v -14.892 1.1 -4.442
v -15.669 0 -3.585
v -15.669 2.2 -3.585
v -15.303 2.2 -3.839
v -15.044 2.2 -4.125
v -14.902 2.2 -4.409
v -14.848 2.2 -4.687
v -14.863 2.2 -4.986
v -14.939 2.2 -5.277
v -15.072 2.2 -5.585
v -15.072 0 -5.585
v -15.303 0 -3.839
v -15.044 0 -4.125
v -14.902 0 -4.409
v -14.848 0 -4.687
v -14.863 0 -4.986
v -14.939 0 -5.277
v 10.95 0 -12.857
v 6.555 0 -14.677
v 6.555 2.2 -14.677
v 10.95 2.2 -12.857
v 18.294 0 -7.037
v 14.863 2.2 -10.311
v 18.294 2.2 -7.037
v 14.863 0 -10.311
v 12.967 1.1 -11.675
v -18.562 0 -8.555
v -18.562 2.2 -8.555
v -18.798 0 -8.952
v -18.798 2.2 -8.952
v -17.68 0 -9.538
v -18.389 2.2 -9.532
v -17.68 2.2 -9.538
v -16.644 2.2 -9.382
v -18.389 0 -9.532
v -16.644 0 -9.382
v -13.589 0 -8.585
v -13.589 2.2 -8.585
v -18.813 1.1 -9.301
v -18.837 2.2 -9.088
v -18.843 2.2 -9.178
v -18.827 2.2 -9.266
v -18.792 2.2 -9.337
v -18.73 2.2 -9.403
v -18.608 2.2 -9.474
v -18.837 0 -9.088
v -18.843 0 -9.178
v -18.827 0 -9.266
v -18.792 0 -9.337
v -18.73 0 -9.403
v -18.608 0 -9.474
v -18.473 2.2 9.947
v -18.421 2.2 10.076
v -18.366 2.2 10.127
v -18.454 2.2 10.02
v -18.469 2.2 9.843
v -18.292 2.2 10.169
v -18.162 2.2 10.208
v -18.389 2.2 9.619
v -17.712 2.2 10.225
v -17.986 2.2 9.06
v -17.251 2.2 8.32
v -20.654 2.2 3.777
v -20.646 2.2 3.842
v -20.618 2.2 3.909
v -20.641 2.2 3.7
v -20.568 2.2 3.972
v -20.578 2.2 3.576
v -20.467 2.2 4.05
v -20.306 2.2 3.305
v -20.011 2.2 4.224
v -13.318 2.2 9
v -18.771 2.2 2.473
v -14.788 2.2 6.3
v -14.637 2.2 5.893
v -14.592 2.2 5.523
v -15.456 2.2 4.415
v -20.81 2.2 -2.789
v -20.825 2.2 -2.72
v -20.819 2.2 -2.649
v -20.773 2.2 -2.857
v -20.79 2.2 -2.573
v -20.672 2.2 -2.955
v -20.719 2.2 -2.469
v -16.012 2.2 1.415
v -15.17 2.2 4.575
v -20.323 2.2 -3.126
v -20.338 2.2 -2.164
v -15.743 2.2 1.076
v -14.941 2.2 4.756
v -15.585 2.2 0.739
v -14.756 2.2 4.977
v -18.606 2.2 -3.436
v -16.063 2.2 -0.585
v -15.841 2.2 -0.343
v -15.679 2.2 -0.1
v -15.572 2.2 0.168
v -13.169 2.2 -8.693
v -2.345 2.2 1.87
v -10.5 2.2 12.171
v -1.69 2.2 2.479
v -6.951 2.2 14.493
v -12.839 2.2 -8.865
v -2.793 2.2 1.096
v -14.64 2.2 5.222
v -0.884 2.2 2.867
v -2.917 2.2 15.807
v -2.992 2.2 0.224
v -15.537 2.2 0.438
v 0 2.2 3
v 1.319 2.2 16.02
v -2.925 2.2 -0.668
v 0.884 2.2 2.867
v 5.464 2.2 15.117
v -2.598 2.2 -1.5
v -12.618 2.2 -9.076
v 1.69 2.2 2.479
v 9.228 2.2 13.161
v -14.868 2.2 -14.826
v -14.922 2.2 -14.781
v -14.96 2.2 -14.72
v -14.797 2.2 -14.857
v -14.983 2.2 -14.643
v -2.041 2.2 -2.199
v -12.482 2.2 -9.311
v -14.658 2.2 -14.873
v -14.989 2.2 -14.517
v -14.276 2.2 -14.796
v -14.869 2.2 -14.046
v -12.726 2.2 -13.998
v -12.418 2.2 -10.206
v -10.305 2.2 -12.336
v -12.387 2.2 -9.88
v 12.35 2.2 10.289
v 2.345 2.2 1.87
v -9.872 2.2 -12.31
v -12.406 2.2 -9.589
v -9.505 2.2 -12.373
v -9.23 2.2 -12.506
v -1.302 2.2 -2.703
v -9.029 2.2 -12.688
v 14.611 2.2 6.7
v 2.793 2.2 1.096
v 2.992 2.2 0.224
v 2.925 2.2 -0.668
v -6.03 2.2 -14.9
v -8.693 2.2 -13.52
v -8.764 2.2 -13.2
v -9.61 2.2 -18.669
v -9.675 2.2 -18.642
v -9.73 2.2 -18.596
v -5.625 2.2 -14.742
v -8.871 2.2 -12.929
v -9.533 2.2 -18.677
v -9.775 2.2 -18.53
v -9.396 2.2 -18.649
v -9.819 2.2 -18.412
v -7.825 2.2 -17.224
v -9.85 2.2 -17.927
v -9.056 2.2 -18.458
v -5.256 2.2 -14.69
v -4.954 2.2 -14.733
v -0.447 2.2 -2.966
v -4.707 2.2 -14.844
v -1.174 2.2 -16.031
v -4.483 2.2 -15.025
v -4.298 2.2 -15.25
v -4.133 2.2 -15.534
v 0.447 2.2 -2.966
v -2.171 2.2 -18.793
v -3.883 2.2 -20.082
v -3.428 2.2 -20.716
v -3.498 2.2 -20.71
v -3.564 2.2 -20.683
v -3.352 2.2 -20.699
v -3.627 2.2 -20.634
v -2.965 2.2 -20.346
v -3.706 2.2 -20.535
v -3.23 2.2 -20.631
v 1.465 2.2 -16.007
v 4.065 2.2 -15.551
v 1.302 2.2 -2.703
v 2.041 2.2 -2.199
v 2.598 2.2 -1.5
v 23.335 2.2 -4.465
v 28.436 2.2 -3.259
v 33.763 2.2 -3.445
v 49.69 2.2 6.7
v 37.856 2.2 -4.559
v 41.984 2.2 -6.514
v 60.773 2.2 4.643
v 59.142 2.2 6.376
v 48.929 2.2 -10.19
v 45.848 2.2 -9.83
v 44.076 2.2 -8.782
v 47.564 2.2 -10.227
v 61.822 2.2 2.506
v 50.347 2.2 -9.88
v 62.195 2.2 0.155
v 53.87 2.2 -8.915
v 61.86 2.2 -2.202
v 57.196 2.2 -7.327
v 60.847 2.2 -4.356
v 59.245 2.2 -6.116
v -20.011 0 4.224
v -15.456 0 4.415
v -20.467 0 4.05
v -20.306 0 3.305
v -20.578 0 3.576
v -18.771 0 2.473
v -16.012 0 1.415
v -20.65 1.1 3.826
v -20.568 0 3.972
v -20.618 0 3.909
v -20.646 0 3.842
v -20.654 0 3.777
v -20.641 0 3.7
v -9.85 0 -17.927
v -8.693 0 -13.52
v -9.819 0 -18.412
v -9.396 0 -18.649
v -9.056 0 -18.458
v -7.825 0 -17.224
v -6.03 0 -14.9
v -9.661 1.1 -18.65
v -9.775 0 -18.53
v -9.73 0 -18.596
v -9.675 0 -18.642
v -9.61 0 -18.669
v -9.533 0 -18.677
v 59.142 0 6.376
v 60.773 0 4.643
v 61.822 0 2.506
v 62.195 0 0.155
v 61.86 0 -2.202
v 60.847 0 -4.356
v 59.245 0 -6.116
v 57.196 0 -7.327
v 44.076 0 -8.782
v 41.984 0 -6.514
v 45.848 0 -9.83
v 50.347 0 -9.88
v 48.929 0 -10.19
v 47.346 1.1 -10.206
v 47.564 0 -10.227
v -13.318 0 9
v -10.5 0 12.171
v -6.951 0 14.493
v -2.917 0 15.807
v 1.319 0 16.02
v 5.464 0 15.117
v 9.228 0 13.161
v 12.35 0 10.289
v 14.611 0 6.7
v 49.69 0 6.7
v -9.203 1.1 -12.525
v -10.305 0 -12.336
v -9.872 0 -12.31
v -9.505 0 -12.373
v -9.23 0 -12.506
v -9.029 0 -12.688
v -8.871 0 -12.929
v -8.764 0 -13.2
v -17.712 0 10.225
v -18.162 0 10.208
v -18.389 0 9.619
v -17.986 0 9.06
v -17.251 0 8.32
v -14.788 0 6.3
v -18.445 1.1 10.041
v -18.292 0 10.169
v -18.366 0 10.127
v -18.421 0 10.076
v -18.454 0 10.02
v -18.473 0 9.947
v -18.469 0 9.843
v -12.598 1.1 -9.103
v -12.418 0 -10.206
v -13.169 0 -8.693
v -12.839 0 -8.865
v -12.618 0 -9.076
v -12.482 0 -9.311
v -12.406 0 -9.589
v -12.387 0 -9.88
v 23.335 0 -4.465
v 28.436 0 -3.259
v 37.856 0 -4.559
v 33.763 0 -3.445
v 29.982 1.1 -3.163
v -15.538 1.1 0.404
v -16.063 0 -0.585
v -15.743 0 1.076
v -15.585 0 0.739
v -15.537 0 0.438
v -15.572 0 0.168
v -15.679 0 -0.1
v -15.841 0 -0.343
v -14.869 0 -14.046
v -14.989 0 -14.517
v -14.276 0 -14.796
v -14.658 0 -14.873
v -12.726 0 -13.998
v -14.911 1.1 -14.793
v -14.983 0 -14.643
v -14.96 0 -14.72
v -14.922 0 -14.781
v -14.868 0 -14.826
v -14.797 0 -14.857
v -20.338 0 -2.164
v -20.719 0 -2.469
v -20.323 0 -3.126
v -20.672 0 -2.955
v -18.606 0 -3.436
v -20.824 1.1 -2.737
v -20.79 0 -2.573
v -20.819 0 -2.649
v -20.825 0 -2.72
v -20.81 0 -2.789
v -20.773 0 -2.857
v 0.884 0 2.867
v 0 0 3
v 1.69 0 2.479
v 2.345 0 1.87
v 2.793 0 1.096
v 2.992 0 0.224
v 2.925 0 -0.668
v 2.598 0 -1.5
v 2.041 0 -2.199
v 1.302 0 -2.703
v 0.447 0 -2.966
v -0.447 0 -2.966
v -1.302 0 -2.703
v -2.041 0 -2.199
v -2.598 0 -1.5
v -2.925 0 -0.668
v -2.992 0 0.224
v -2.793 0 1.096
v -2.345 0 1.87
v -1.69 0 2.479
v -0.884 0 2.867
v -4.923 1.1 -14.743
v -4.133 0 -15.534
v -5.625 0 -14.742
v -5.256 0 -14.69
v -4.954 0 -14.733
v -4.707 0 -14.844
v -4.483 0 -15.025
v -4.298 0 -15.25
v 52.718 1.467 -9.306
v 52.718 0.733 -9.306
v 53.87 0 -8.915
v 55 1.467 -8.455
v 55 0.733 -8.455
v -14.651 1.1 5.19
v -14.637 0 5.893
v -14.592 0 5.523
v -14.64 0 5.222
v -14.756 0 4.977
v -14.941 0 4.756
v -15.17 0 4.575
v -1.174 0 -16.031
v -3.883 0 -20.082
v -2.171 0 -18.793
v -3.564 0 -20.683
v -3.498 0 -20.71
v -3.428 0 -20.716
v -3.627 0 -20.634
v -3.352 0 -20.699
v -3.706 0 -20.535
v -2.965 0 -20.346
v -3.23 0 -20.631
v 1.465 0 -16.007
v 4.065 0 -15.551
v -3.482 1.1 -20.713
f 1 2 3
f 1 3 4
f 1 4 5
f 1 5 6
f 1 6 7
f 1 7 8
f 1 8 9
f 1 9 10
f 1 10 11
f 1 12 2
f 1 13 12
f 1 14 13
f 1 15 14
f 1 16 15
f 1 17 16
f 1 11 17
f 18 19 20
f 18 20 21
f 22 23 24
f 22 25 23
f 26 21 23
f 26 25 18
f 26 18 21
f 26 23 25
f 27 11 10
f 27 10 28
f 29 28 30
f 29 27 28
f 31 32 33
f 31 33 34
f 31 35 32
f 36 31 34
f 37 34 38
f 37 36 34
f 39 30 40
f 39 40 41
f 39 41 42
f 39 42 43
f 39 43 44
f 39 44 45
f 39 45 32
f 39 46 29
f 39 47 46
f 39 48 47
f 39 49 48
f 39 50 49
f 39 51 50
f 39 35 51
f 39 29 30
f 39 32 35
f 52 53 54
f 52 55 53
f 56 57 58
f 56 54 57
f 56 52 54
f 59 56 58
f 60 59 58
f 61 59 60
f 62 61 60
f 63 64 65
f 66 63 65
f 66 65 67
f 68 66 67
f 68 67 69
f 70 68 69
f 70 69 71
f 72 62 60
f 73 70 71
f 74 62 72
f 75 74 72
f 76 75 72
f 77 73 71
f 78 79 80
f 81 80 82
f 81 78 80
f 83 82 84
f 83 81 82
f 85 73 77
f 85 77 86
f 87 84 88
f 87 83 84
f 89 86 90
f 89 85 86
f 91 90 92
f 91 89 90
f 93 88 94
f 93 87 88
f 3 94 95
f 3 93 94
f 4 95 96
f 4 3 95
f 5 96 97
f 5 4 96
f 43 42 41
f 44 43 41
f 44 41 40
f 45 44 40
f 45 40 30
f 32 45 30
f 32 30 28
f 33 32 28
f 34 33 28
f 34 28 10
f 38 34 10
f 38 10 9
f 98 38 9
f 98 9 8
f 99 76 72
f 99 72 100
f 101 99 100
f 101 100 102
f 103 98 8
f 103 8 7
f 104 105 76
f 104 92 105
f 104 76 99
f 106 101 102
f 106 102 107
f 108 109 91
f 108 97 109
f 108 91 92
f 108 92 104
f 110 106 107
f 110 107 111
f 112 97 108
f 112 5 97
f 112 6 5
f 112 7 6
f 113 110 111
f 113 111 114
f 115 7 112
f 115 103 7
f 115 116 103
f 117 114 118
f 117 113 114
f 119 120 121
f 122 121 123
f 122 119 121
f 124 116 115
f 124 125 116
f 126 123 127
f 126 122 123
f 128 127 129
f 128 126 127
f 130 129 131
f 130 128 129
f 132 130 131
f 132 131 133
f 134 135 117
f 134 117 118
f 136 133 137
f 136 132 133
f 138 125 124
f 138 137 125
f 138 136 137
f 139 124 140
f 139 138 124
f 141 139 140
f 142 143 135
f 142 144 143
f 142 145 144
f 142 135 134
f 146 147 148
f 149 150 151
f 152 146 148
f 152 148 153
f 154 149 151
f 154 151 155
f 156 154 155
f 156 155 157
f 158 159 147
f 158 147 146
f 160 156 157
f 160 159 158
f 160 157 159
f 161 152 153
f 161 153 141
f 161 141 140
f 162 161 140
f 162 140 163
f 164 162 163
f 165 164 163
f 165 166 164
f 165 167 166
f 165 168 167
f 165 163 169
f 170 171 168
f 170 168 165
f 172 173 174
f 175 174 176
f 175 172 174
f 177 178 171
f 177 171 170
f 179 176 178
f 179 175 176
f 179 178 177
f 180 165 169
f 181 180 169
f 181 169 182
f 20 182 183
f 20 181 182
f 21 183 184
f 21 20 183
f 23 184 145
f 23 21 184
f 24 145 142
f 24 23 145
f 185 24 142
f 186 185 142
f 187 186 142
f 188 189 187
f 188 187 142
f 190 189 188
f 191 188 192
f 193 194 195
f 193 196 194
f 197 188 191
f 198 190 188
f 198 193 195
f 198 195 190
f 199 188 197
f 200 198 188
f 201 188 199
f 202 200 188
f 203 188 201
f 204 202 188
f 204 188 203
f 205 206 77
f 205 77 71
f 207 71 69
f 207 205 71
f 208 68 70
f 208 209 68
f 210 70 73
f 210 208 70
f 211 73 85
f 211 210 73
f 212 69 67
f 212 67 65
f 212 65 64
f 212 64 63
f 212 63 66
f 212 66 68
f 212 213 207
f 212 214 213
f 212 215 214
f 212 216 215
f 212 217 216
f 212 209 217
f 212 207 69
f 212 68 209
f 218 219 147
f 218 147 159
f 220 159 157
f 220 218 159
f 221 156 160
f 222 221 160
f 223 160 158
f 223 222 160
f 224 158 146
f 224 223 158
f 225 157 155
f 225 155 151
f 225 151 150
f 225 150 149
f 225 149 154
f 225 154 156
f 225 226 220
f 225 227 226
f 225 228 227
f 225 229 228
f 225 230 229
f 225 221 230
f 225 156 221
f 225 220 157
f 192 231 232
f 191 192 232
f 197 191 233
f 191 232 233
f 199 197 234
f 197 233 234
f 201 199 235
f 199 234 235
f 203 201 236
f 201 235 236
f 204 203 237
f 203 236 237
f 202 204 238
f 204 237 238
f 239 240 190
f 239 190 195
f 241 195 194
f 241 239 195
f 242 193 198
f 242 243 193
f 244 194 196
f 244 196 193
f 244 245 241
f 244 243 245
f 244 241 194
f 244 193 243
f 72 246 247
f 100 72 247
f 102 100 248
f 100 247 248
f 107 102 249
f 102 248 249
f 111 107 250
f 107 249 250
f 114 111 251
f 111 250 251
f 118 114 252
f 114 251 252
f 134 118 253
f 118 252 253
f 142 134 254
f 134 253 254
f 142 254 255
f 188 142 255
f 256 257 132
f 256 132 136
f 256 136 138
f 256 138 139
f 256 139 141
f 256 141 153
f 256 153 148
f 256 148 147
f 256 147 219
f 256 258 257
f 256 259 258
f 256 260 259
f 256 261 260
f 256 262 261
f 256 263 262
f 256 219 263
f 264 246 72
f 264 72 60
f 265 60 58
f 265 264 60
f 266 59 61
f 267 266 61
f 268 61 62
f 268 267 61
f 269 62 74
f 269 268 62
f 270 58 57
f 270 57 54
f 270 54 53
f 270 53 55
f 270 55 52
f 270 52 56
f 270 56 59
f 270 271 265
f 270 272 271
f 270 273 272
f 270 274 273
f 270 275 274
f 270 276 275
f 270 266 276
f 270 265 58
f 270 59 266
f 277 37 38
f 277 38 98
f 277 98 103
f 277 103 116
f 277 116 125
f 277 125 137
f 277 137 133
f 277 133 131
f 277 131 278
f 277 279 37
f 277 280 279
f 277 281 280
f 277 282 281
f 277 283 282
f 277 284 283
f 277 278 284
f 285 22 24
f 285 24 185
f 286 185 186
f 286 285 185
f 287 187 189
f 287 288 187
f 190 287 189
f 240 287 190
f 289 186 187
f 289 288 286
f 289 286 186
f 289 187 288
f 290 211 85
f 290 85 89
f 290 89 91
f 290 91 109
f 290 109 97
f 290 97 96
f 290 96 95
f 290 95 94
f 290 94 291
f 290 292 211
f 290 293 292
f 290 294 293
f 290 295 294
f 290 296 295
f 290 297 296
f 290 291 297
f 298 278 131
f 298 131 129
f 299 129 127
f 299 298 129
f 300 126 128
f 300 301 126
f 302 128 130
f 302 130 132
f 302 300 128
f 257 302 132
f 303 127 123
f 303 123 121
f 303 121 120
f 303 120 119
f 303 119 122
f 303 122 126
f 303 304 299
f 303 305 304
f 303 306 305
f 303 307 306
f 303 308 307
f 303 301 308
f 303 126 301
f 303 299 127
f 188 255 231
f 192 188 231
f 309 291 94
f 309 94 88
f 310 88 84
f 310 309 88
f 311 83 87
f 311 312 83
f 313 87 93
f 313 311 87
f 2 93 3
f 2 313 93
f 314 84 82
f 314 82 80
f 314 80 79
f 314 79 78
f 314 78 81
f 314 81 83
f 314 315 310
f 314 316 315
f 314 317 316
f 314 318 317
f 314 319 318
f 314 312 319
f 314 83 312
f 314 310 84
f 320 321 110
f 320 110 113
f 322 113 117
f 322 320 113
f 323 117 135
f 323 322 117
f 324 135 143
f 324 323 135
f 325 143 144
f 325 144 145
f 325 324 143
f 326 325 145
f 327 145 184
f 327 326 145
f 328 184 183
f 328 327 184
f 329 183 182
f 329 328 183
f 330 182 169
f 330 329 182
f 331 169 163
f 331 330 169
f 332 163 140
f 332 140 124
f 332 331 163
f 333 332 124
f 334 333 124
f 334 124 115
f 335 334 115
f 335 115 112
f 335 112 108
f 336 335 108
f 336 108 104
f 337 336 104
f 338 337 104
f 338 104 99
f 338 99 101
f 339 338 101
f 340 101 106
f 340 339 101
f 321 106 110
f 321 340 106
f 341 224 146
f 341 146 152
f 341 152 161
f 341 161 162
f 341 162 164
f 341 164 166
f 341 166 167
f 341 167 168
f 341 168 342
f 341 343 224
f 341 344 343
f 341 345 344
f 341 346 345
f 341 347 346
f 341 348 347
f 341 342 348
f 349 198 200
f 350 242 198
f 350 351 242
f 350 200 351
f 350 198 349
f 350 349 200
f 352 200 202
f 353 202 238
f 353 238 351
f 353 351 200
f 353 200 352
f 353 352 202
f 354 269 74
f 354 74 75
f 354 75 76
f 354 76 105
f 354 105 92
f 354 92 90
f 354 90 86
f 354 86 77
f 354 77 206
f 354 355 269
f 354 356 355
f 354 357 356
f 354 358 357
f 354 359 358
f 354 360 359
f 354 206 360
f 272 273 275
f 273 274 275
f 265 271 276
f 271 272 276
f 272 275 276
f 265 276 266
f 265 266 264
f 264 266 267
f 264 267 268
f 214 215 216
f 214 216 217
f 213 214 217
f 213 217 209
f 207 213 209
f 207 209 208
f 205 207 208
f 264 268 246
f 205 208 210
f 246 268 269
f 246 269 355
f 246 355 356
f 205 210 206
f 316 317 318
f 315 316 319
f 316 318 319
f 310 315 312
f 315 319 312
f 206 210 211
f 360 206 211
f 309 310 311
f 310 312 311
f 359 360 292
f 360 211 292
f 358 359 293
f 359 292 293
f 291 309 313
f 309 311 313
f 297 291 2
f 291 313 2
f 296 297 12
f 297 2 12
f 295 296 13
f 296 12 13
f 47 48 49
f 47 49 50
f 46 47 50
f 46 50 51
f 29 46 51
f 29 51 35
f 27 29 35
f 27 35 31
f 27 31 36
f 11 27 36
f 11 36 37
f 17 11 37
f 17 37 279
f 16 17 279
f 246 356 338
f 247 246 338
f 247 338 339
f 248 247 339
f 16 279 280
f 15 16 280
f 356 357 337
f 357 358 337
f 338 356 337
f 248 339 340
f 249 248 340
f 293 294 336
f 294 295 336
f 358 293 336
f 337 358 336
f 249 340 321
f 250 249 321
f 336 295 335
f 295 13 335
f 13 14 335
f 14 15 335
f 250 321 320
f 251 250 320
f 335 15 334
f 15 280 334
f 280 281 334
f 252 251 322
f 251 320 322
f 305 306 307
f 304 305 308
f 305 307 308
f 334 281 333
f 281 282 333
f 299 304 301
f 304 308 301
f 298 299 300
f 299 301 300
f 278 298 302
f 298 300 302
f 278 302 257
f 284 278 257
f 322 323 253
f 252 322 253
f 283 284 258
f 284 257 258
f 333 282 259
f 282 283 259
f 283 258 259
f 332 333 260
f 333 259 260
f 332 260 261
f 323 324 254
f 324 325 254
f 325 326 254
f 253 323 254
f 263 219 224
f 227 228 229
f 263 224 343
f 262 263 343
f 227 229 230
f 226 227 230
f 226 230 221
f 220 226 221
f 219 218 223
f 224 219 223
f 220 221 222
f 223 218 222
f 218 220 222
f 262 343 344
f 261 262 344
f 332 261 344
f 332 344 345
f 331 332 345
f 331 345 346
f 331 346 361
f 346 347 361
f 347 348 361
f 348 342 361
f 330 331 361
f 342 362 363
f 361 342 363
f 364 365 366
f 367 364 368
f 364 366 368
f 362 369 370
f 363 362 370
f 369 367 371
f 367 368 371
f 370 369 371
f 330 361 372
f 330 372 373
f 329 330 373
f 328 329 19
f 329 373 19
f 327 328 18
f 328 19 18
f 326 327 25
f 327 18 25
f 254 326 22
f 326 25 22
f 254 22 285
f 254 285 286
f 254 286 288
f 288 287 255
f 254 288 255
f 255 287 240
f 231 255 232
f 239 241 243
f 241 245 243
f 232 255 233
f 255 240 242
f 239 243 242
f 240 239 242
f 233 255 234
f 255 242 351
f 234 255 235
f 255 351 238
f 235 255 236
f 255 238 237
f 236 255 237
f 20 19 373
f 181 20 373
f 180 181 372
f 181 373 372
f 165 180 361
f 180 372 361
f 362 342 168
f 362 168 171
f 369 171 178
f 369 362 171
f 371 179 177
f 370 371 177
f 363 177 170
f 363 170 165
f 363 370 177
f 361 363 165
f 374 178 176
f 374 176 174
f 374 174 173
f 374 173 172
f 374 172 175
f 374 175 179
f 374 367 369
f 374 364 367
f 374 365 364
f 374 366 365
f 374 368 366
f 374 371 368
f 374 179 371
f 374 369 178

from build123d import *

# Parameters (mm, degrees)
SKETCH_1_R      = 3
EXTRUDE_1_DEPTH = 2.2


with BuildPart() as part:
    # 草图1 → 凸台-拉伸1 (new body)
    with BuildSketch(Plane(origin=(0, 0, 0), x_dir=(1, 0, 0), z_dir=(0, 1, 0))):
        with BuildLine():
            Line((14.611038219, -6.7), (49.690443214, -6.7))
            Line((49.690443214, -6.7), (59.14213471, -6.376451123))
            ThreePointArc((59.14213471, -6.376451123), (62.116009682, 1.036036266), (57.195522798, 7.327118086))
            add(Edge.make_bspline(
                [(50.347107534, 9.880159683), (52.761361064, 9.443859829), (55.044166152, 8.592845964), (57.195522798, 7.327118086)],
                knots=[0.288436631, 0.288436631, 0.288436631, 0.288436631, 1, 1, 1, 1], degree=3))
            add(Edge.make_bspline(
                [(41.984360593, 6.514151987), (43.667045792, 8.848960271), (46.317081673, 10.55679372), (49.303704664, 10.196073302), (50.347107534, 9.880159683)],
                knots=[0.090085046, 0.090085046, 0.090085046, 0.090085046, 0.520368733, 0.736118782, 0.736118782, 0.736118782, 0.736118782], degree=3))
            add(Edge.make_bspline(
                [(18.29395406, 7.037125327), (29.823970963, -0.449921726), (41.984360593, 6.514151987)],
                knots=[0, 0, 0, 1, 1, 1], degree=2))
            add(Edge.make_bspline(
                [(6.555128163, 14.676604942), (13.508953417, 12.492816522), (18.29395406, 7.037125327)],
                knots=[0, 0, 0, 1, 1, 1], degree=2))
            ThreePointArc((6.555128163, 14.676604942), (2.774471684, 15.832711225), (-1.174023286, 16.031035749))
            add(Edge.make_bspline(
                [(-4.132506817, 15.533667476), (-4.311159294, 25.643963381), (-1.174023286, 16.031035749)],
                knots=[0, 0, 0, 1, 1, 1], degree=2))
            add(Edge.make_bspline(
                [(-6.029547406, 14.900234761), (-4.764310754, 14.268430824), (-4.132506817, 15.533667476)],
                knots=[0, 0, 0, 1, 1, 1], degree=2))
            add(Edge.make_bspline(
                [(-8.69333509, 13.520294481), (-11.961242179, 23.089556901), (-6.029547406, 14.900234761)],
                knots=[0, 0, 0, 1, 1, 1], degree=2))
            add(Edge.make_bspline(
                [(-10.305043141, 12.336065974), (-8.907074862, 12.122326202), (-8.69333509, 13.520294481)],
                knots=[0, 0, 0, 1, 1, 1], degree=2))
            add(Edge.make_bspline(
                [(-12.417884822, 10.206300721), (-18.460681491, 18.31398895), (-10.305043141, 12.336065974)],
                knots=[0, 0, 0, 1, 1, 1], degree=2))
            add(Edge.make_bspline(
                [(-13.589217783, 8.585196439), (-12.192999161, 8.810082099), (-12.417884822, 10.206300721)],
                knots=[0, 0, 0, 1, 1, 1], degree=2))
            add(Edge.make_bspline(
                [(-15.07242577, 5.585196439), (-23.295073991, 11.517146599), (-13.589217783, 8.585196439)],
                knots=[0, 0, 0, 1, 1, 1], degree=2))
            add(Edge.make_bspline(
                [(-15.669039675, 3.585196439), (-14.412461062, 4.29933734), (-15.07242577, 5.585196439)],
                knots=[0, 0, 0, 1, 1, 1], degree=2))
            add(Edge.make_bspline(
                [(-16.063311706, 0.585196439), (-25.780917218, 3.388231532), (-15.669039675, 3.585196439)],
                knots=[0, 0, 0, 1, 1, 1], degree=2))
            add(Edge.make_bspline(
                [(-16.011582331, -1.414803561), (-15.037875075, -0.394118455), (-16.063311706, 0.585196439)],
                knots=[0, 0, 0, 1, 1, 1], degree=2))
            add(Edge.make_bspline(
                [(-15.455806267, -4.414803561), (-25.566384923, -4.736394924), (-16.011582331, -1.414803561)],
                knots=[0, 0, 0, 1, 1, 1], degree=2))
            add(Edge.make_bspline(
                [(-14.787919584, -6.299989859), (-14.179269776, -5.023453369), (-15.455806267, -4.414803561)],
                knots=[0, 0, 0, 1, 1, 1], degree=2))
            add(Edge.make_bspline(
                [(-13.318124412, -9), (-22.835991784, -12.431149783), (-14.787919584, -6.299989859)],
                knots=[0, 0, 0, 1, 1, 1], degree=2))
            ThreePointArc((-13.318124412, -9), (1.319244681, -16.019738803), (14.611038219, -6.7))
        make_face()
        with Locations(Location((0, 0, 0), (0, 0, 270))):
            Circle(SKETCH_1_R, mode=Mode.SUBTRACT)
    extrude(amount=EXTRUDE_1_DEPTH)


solid = part.part
